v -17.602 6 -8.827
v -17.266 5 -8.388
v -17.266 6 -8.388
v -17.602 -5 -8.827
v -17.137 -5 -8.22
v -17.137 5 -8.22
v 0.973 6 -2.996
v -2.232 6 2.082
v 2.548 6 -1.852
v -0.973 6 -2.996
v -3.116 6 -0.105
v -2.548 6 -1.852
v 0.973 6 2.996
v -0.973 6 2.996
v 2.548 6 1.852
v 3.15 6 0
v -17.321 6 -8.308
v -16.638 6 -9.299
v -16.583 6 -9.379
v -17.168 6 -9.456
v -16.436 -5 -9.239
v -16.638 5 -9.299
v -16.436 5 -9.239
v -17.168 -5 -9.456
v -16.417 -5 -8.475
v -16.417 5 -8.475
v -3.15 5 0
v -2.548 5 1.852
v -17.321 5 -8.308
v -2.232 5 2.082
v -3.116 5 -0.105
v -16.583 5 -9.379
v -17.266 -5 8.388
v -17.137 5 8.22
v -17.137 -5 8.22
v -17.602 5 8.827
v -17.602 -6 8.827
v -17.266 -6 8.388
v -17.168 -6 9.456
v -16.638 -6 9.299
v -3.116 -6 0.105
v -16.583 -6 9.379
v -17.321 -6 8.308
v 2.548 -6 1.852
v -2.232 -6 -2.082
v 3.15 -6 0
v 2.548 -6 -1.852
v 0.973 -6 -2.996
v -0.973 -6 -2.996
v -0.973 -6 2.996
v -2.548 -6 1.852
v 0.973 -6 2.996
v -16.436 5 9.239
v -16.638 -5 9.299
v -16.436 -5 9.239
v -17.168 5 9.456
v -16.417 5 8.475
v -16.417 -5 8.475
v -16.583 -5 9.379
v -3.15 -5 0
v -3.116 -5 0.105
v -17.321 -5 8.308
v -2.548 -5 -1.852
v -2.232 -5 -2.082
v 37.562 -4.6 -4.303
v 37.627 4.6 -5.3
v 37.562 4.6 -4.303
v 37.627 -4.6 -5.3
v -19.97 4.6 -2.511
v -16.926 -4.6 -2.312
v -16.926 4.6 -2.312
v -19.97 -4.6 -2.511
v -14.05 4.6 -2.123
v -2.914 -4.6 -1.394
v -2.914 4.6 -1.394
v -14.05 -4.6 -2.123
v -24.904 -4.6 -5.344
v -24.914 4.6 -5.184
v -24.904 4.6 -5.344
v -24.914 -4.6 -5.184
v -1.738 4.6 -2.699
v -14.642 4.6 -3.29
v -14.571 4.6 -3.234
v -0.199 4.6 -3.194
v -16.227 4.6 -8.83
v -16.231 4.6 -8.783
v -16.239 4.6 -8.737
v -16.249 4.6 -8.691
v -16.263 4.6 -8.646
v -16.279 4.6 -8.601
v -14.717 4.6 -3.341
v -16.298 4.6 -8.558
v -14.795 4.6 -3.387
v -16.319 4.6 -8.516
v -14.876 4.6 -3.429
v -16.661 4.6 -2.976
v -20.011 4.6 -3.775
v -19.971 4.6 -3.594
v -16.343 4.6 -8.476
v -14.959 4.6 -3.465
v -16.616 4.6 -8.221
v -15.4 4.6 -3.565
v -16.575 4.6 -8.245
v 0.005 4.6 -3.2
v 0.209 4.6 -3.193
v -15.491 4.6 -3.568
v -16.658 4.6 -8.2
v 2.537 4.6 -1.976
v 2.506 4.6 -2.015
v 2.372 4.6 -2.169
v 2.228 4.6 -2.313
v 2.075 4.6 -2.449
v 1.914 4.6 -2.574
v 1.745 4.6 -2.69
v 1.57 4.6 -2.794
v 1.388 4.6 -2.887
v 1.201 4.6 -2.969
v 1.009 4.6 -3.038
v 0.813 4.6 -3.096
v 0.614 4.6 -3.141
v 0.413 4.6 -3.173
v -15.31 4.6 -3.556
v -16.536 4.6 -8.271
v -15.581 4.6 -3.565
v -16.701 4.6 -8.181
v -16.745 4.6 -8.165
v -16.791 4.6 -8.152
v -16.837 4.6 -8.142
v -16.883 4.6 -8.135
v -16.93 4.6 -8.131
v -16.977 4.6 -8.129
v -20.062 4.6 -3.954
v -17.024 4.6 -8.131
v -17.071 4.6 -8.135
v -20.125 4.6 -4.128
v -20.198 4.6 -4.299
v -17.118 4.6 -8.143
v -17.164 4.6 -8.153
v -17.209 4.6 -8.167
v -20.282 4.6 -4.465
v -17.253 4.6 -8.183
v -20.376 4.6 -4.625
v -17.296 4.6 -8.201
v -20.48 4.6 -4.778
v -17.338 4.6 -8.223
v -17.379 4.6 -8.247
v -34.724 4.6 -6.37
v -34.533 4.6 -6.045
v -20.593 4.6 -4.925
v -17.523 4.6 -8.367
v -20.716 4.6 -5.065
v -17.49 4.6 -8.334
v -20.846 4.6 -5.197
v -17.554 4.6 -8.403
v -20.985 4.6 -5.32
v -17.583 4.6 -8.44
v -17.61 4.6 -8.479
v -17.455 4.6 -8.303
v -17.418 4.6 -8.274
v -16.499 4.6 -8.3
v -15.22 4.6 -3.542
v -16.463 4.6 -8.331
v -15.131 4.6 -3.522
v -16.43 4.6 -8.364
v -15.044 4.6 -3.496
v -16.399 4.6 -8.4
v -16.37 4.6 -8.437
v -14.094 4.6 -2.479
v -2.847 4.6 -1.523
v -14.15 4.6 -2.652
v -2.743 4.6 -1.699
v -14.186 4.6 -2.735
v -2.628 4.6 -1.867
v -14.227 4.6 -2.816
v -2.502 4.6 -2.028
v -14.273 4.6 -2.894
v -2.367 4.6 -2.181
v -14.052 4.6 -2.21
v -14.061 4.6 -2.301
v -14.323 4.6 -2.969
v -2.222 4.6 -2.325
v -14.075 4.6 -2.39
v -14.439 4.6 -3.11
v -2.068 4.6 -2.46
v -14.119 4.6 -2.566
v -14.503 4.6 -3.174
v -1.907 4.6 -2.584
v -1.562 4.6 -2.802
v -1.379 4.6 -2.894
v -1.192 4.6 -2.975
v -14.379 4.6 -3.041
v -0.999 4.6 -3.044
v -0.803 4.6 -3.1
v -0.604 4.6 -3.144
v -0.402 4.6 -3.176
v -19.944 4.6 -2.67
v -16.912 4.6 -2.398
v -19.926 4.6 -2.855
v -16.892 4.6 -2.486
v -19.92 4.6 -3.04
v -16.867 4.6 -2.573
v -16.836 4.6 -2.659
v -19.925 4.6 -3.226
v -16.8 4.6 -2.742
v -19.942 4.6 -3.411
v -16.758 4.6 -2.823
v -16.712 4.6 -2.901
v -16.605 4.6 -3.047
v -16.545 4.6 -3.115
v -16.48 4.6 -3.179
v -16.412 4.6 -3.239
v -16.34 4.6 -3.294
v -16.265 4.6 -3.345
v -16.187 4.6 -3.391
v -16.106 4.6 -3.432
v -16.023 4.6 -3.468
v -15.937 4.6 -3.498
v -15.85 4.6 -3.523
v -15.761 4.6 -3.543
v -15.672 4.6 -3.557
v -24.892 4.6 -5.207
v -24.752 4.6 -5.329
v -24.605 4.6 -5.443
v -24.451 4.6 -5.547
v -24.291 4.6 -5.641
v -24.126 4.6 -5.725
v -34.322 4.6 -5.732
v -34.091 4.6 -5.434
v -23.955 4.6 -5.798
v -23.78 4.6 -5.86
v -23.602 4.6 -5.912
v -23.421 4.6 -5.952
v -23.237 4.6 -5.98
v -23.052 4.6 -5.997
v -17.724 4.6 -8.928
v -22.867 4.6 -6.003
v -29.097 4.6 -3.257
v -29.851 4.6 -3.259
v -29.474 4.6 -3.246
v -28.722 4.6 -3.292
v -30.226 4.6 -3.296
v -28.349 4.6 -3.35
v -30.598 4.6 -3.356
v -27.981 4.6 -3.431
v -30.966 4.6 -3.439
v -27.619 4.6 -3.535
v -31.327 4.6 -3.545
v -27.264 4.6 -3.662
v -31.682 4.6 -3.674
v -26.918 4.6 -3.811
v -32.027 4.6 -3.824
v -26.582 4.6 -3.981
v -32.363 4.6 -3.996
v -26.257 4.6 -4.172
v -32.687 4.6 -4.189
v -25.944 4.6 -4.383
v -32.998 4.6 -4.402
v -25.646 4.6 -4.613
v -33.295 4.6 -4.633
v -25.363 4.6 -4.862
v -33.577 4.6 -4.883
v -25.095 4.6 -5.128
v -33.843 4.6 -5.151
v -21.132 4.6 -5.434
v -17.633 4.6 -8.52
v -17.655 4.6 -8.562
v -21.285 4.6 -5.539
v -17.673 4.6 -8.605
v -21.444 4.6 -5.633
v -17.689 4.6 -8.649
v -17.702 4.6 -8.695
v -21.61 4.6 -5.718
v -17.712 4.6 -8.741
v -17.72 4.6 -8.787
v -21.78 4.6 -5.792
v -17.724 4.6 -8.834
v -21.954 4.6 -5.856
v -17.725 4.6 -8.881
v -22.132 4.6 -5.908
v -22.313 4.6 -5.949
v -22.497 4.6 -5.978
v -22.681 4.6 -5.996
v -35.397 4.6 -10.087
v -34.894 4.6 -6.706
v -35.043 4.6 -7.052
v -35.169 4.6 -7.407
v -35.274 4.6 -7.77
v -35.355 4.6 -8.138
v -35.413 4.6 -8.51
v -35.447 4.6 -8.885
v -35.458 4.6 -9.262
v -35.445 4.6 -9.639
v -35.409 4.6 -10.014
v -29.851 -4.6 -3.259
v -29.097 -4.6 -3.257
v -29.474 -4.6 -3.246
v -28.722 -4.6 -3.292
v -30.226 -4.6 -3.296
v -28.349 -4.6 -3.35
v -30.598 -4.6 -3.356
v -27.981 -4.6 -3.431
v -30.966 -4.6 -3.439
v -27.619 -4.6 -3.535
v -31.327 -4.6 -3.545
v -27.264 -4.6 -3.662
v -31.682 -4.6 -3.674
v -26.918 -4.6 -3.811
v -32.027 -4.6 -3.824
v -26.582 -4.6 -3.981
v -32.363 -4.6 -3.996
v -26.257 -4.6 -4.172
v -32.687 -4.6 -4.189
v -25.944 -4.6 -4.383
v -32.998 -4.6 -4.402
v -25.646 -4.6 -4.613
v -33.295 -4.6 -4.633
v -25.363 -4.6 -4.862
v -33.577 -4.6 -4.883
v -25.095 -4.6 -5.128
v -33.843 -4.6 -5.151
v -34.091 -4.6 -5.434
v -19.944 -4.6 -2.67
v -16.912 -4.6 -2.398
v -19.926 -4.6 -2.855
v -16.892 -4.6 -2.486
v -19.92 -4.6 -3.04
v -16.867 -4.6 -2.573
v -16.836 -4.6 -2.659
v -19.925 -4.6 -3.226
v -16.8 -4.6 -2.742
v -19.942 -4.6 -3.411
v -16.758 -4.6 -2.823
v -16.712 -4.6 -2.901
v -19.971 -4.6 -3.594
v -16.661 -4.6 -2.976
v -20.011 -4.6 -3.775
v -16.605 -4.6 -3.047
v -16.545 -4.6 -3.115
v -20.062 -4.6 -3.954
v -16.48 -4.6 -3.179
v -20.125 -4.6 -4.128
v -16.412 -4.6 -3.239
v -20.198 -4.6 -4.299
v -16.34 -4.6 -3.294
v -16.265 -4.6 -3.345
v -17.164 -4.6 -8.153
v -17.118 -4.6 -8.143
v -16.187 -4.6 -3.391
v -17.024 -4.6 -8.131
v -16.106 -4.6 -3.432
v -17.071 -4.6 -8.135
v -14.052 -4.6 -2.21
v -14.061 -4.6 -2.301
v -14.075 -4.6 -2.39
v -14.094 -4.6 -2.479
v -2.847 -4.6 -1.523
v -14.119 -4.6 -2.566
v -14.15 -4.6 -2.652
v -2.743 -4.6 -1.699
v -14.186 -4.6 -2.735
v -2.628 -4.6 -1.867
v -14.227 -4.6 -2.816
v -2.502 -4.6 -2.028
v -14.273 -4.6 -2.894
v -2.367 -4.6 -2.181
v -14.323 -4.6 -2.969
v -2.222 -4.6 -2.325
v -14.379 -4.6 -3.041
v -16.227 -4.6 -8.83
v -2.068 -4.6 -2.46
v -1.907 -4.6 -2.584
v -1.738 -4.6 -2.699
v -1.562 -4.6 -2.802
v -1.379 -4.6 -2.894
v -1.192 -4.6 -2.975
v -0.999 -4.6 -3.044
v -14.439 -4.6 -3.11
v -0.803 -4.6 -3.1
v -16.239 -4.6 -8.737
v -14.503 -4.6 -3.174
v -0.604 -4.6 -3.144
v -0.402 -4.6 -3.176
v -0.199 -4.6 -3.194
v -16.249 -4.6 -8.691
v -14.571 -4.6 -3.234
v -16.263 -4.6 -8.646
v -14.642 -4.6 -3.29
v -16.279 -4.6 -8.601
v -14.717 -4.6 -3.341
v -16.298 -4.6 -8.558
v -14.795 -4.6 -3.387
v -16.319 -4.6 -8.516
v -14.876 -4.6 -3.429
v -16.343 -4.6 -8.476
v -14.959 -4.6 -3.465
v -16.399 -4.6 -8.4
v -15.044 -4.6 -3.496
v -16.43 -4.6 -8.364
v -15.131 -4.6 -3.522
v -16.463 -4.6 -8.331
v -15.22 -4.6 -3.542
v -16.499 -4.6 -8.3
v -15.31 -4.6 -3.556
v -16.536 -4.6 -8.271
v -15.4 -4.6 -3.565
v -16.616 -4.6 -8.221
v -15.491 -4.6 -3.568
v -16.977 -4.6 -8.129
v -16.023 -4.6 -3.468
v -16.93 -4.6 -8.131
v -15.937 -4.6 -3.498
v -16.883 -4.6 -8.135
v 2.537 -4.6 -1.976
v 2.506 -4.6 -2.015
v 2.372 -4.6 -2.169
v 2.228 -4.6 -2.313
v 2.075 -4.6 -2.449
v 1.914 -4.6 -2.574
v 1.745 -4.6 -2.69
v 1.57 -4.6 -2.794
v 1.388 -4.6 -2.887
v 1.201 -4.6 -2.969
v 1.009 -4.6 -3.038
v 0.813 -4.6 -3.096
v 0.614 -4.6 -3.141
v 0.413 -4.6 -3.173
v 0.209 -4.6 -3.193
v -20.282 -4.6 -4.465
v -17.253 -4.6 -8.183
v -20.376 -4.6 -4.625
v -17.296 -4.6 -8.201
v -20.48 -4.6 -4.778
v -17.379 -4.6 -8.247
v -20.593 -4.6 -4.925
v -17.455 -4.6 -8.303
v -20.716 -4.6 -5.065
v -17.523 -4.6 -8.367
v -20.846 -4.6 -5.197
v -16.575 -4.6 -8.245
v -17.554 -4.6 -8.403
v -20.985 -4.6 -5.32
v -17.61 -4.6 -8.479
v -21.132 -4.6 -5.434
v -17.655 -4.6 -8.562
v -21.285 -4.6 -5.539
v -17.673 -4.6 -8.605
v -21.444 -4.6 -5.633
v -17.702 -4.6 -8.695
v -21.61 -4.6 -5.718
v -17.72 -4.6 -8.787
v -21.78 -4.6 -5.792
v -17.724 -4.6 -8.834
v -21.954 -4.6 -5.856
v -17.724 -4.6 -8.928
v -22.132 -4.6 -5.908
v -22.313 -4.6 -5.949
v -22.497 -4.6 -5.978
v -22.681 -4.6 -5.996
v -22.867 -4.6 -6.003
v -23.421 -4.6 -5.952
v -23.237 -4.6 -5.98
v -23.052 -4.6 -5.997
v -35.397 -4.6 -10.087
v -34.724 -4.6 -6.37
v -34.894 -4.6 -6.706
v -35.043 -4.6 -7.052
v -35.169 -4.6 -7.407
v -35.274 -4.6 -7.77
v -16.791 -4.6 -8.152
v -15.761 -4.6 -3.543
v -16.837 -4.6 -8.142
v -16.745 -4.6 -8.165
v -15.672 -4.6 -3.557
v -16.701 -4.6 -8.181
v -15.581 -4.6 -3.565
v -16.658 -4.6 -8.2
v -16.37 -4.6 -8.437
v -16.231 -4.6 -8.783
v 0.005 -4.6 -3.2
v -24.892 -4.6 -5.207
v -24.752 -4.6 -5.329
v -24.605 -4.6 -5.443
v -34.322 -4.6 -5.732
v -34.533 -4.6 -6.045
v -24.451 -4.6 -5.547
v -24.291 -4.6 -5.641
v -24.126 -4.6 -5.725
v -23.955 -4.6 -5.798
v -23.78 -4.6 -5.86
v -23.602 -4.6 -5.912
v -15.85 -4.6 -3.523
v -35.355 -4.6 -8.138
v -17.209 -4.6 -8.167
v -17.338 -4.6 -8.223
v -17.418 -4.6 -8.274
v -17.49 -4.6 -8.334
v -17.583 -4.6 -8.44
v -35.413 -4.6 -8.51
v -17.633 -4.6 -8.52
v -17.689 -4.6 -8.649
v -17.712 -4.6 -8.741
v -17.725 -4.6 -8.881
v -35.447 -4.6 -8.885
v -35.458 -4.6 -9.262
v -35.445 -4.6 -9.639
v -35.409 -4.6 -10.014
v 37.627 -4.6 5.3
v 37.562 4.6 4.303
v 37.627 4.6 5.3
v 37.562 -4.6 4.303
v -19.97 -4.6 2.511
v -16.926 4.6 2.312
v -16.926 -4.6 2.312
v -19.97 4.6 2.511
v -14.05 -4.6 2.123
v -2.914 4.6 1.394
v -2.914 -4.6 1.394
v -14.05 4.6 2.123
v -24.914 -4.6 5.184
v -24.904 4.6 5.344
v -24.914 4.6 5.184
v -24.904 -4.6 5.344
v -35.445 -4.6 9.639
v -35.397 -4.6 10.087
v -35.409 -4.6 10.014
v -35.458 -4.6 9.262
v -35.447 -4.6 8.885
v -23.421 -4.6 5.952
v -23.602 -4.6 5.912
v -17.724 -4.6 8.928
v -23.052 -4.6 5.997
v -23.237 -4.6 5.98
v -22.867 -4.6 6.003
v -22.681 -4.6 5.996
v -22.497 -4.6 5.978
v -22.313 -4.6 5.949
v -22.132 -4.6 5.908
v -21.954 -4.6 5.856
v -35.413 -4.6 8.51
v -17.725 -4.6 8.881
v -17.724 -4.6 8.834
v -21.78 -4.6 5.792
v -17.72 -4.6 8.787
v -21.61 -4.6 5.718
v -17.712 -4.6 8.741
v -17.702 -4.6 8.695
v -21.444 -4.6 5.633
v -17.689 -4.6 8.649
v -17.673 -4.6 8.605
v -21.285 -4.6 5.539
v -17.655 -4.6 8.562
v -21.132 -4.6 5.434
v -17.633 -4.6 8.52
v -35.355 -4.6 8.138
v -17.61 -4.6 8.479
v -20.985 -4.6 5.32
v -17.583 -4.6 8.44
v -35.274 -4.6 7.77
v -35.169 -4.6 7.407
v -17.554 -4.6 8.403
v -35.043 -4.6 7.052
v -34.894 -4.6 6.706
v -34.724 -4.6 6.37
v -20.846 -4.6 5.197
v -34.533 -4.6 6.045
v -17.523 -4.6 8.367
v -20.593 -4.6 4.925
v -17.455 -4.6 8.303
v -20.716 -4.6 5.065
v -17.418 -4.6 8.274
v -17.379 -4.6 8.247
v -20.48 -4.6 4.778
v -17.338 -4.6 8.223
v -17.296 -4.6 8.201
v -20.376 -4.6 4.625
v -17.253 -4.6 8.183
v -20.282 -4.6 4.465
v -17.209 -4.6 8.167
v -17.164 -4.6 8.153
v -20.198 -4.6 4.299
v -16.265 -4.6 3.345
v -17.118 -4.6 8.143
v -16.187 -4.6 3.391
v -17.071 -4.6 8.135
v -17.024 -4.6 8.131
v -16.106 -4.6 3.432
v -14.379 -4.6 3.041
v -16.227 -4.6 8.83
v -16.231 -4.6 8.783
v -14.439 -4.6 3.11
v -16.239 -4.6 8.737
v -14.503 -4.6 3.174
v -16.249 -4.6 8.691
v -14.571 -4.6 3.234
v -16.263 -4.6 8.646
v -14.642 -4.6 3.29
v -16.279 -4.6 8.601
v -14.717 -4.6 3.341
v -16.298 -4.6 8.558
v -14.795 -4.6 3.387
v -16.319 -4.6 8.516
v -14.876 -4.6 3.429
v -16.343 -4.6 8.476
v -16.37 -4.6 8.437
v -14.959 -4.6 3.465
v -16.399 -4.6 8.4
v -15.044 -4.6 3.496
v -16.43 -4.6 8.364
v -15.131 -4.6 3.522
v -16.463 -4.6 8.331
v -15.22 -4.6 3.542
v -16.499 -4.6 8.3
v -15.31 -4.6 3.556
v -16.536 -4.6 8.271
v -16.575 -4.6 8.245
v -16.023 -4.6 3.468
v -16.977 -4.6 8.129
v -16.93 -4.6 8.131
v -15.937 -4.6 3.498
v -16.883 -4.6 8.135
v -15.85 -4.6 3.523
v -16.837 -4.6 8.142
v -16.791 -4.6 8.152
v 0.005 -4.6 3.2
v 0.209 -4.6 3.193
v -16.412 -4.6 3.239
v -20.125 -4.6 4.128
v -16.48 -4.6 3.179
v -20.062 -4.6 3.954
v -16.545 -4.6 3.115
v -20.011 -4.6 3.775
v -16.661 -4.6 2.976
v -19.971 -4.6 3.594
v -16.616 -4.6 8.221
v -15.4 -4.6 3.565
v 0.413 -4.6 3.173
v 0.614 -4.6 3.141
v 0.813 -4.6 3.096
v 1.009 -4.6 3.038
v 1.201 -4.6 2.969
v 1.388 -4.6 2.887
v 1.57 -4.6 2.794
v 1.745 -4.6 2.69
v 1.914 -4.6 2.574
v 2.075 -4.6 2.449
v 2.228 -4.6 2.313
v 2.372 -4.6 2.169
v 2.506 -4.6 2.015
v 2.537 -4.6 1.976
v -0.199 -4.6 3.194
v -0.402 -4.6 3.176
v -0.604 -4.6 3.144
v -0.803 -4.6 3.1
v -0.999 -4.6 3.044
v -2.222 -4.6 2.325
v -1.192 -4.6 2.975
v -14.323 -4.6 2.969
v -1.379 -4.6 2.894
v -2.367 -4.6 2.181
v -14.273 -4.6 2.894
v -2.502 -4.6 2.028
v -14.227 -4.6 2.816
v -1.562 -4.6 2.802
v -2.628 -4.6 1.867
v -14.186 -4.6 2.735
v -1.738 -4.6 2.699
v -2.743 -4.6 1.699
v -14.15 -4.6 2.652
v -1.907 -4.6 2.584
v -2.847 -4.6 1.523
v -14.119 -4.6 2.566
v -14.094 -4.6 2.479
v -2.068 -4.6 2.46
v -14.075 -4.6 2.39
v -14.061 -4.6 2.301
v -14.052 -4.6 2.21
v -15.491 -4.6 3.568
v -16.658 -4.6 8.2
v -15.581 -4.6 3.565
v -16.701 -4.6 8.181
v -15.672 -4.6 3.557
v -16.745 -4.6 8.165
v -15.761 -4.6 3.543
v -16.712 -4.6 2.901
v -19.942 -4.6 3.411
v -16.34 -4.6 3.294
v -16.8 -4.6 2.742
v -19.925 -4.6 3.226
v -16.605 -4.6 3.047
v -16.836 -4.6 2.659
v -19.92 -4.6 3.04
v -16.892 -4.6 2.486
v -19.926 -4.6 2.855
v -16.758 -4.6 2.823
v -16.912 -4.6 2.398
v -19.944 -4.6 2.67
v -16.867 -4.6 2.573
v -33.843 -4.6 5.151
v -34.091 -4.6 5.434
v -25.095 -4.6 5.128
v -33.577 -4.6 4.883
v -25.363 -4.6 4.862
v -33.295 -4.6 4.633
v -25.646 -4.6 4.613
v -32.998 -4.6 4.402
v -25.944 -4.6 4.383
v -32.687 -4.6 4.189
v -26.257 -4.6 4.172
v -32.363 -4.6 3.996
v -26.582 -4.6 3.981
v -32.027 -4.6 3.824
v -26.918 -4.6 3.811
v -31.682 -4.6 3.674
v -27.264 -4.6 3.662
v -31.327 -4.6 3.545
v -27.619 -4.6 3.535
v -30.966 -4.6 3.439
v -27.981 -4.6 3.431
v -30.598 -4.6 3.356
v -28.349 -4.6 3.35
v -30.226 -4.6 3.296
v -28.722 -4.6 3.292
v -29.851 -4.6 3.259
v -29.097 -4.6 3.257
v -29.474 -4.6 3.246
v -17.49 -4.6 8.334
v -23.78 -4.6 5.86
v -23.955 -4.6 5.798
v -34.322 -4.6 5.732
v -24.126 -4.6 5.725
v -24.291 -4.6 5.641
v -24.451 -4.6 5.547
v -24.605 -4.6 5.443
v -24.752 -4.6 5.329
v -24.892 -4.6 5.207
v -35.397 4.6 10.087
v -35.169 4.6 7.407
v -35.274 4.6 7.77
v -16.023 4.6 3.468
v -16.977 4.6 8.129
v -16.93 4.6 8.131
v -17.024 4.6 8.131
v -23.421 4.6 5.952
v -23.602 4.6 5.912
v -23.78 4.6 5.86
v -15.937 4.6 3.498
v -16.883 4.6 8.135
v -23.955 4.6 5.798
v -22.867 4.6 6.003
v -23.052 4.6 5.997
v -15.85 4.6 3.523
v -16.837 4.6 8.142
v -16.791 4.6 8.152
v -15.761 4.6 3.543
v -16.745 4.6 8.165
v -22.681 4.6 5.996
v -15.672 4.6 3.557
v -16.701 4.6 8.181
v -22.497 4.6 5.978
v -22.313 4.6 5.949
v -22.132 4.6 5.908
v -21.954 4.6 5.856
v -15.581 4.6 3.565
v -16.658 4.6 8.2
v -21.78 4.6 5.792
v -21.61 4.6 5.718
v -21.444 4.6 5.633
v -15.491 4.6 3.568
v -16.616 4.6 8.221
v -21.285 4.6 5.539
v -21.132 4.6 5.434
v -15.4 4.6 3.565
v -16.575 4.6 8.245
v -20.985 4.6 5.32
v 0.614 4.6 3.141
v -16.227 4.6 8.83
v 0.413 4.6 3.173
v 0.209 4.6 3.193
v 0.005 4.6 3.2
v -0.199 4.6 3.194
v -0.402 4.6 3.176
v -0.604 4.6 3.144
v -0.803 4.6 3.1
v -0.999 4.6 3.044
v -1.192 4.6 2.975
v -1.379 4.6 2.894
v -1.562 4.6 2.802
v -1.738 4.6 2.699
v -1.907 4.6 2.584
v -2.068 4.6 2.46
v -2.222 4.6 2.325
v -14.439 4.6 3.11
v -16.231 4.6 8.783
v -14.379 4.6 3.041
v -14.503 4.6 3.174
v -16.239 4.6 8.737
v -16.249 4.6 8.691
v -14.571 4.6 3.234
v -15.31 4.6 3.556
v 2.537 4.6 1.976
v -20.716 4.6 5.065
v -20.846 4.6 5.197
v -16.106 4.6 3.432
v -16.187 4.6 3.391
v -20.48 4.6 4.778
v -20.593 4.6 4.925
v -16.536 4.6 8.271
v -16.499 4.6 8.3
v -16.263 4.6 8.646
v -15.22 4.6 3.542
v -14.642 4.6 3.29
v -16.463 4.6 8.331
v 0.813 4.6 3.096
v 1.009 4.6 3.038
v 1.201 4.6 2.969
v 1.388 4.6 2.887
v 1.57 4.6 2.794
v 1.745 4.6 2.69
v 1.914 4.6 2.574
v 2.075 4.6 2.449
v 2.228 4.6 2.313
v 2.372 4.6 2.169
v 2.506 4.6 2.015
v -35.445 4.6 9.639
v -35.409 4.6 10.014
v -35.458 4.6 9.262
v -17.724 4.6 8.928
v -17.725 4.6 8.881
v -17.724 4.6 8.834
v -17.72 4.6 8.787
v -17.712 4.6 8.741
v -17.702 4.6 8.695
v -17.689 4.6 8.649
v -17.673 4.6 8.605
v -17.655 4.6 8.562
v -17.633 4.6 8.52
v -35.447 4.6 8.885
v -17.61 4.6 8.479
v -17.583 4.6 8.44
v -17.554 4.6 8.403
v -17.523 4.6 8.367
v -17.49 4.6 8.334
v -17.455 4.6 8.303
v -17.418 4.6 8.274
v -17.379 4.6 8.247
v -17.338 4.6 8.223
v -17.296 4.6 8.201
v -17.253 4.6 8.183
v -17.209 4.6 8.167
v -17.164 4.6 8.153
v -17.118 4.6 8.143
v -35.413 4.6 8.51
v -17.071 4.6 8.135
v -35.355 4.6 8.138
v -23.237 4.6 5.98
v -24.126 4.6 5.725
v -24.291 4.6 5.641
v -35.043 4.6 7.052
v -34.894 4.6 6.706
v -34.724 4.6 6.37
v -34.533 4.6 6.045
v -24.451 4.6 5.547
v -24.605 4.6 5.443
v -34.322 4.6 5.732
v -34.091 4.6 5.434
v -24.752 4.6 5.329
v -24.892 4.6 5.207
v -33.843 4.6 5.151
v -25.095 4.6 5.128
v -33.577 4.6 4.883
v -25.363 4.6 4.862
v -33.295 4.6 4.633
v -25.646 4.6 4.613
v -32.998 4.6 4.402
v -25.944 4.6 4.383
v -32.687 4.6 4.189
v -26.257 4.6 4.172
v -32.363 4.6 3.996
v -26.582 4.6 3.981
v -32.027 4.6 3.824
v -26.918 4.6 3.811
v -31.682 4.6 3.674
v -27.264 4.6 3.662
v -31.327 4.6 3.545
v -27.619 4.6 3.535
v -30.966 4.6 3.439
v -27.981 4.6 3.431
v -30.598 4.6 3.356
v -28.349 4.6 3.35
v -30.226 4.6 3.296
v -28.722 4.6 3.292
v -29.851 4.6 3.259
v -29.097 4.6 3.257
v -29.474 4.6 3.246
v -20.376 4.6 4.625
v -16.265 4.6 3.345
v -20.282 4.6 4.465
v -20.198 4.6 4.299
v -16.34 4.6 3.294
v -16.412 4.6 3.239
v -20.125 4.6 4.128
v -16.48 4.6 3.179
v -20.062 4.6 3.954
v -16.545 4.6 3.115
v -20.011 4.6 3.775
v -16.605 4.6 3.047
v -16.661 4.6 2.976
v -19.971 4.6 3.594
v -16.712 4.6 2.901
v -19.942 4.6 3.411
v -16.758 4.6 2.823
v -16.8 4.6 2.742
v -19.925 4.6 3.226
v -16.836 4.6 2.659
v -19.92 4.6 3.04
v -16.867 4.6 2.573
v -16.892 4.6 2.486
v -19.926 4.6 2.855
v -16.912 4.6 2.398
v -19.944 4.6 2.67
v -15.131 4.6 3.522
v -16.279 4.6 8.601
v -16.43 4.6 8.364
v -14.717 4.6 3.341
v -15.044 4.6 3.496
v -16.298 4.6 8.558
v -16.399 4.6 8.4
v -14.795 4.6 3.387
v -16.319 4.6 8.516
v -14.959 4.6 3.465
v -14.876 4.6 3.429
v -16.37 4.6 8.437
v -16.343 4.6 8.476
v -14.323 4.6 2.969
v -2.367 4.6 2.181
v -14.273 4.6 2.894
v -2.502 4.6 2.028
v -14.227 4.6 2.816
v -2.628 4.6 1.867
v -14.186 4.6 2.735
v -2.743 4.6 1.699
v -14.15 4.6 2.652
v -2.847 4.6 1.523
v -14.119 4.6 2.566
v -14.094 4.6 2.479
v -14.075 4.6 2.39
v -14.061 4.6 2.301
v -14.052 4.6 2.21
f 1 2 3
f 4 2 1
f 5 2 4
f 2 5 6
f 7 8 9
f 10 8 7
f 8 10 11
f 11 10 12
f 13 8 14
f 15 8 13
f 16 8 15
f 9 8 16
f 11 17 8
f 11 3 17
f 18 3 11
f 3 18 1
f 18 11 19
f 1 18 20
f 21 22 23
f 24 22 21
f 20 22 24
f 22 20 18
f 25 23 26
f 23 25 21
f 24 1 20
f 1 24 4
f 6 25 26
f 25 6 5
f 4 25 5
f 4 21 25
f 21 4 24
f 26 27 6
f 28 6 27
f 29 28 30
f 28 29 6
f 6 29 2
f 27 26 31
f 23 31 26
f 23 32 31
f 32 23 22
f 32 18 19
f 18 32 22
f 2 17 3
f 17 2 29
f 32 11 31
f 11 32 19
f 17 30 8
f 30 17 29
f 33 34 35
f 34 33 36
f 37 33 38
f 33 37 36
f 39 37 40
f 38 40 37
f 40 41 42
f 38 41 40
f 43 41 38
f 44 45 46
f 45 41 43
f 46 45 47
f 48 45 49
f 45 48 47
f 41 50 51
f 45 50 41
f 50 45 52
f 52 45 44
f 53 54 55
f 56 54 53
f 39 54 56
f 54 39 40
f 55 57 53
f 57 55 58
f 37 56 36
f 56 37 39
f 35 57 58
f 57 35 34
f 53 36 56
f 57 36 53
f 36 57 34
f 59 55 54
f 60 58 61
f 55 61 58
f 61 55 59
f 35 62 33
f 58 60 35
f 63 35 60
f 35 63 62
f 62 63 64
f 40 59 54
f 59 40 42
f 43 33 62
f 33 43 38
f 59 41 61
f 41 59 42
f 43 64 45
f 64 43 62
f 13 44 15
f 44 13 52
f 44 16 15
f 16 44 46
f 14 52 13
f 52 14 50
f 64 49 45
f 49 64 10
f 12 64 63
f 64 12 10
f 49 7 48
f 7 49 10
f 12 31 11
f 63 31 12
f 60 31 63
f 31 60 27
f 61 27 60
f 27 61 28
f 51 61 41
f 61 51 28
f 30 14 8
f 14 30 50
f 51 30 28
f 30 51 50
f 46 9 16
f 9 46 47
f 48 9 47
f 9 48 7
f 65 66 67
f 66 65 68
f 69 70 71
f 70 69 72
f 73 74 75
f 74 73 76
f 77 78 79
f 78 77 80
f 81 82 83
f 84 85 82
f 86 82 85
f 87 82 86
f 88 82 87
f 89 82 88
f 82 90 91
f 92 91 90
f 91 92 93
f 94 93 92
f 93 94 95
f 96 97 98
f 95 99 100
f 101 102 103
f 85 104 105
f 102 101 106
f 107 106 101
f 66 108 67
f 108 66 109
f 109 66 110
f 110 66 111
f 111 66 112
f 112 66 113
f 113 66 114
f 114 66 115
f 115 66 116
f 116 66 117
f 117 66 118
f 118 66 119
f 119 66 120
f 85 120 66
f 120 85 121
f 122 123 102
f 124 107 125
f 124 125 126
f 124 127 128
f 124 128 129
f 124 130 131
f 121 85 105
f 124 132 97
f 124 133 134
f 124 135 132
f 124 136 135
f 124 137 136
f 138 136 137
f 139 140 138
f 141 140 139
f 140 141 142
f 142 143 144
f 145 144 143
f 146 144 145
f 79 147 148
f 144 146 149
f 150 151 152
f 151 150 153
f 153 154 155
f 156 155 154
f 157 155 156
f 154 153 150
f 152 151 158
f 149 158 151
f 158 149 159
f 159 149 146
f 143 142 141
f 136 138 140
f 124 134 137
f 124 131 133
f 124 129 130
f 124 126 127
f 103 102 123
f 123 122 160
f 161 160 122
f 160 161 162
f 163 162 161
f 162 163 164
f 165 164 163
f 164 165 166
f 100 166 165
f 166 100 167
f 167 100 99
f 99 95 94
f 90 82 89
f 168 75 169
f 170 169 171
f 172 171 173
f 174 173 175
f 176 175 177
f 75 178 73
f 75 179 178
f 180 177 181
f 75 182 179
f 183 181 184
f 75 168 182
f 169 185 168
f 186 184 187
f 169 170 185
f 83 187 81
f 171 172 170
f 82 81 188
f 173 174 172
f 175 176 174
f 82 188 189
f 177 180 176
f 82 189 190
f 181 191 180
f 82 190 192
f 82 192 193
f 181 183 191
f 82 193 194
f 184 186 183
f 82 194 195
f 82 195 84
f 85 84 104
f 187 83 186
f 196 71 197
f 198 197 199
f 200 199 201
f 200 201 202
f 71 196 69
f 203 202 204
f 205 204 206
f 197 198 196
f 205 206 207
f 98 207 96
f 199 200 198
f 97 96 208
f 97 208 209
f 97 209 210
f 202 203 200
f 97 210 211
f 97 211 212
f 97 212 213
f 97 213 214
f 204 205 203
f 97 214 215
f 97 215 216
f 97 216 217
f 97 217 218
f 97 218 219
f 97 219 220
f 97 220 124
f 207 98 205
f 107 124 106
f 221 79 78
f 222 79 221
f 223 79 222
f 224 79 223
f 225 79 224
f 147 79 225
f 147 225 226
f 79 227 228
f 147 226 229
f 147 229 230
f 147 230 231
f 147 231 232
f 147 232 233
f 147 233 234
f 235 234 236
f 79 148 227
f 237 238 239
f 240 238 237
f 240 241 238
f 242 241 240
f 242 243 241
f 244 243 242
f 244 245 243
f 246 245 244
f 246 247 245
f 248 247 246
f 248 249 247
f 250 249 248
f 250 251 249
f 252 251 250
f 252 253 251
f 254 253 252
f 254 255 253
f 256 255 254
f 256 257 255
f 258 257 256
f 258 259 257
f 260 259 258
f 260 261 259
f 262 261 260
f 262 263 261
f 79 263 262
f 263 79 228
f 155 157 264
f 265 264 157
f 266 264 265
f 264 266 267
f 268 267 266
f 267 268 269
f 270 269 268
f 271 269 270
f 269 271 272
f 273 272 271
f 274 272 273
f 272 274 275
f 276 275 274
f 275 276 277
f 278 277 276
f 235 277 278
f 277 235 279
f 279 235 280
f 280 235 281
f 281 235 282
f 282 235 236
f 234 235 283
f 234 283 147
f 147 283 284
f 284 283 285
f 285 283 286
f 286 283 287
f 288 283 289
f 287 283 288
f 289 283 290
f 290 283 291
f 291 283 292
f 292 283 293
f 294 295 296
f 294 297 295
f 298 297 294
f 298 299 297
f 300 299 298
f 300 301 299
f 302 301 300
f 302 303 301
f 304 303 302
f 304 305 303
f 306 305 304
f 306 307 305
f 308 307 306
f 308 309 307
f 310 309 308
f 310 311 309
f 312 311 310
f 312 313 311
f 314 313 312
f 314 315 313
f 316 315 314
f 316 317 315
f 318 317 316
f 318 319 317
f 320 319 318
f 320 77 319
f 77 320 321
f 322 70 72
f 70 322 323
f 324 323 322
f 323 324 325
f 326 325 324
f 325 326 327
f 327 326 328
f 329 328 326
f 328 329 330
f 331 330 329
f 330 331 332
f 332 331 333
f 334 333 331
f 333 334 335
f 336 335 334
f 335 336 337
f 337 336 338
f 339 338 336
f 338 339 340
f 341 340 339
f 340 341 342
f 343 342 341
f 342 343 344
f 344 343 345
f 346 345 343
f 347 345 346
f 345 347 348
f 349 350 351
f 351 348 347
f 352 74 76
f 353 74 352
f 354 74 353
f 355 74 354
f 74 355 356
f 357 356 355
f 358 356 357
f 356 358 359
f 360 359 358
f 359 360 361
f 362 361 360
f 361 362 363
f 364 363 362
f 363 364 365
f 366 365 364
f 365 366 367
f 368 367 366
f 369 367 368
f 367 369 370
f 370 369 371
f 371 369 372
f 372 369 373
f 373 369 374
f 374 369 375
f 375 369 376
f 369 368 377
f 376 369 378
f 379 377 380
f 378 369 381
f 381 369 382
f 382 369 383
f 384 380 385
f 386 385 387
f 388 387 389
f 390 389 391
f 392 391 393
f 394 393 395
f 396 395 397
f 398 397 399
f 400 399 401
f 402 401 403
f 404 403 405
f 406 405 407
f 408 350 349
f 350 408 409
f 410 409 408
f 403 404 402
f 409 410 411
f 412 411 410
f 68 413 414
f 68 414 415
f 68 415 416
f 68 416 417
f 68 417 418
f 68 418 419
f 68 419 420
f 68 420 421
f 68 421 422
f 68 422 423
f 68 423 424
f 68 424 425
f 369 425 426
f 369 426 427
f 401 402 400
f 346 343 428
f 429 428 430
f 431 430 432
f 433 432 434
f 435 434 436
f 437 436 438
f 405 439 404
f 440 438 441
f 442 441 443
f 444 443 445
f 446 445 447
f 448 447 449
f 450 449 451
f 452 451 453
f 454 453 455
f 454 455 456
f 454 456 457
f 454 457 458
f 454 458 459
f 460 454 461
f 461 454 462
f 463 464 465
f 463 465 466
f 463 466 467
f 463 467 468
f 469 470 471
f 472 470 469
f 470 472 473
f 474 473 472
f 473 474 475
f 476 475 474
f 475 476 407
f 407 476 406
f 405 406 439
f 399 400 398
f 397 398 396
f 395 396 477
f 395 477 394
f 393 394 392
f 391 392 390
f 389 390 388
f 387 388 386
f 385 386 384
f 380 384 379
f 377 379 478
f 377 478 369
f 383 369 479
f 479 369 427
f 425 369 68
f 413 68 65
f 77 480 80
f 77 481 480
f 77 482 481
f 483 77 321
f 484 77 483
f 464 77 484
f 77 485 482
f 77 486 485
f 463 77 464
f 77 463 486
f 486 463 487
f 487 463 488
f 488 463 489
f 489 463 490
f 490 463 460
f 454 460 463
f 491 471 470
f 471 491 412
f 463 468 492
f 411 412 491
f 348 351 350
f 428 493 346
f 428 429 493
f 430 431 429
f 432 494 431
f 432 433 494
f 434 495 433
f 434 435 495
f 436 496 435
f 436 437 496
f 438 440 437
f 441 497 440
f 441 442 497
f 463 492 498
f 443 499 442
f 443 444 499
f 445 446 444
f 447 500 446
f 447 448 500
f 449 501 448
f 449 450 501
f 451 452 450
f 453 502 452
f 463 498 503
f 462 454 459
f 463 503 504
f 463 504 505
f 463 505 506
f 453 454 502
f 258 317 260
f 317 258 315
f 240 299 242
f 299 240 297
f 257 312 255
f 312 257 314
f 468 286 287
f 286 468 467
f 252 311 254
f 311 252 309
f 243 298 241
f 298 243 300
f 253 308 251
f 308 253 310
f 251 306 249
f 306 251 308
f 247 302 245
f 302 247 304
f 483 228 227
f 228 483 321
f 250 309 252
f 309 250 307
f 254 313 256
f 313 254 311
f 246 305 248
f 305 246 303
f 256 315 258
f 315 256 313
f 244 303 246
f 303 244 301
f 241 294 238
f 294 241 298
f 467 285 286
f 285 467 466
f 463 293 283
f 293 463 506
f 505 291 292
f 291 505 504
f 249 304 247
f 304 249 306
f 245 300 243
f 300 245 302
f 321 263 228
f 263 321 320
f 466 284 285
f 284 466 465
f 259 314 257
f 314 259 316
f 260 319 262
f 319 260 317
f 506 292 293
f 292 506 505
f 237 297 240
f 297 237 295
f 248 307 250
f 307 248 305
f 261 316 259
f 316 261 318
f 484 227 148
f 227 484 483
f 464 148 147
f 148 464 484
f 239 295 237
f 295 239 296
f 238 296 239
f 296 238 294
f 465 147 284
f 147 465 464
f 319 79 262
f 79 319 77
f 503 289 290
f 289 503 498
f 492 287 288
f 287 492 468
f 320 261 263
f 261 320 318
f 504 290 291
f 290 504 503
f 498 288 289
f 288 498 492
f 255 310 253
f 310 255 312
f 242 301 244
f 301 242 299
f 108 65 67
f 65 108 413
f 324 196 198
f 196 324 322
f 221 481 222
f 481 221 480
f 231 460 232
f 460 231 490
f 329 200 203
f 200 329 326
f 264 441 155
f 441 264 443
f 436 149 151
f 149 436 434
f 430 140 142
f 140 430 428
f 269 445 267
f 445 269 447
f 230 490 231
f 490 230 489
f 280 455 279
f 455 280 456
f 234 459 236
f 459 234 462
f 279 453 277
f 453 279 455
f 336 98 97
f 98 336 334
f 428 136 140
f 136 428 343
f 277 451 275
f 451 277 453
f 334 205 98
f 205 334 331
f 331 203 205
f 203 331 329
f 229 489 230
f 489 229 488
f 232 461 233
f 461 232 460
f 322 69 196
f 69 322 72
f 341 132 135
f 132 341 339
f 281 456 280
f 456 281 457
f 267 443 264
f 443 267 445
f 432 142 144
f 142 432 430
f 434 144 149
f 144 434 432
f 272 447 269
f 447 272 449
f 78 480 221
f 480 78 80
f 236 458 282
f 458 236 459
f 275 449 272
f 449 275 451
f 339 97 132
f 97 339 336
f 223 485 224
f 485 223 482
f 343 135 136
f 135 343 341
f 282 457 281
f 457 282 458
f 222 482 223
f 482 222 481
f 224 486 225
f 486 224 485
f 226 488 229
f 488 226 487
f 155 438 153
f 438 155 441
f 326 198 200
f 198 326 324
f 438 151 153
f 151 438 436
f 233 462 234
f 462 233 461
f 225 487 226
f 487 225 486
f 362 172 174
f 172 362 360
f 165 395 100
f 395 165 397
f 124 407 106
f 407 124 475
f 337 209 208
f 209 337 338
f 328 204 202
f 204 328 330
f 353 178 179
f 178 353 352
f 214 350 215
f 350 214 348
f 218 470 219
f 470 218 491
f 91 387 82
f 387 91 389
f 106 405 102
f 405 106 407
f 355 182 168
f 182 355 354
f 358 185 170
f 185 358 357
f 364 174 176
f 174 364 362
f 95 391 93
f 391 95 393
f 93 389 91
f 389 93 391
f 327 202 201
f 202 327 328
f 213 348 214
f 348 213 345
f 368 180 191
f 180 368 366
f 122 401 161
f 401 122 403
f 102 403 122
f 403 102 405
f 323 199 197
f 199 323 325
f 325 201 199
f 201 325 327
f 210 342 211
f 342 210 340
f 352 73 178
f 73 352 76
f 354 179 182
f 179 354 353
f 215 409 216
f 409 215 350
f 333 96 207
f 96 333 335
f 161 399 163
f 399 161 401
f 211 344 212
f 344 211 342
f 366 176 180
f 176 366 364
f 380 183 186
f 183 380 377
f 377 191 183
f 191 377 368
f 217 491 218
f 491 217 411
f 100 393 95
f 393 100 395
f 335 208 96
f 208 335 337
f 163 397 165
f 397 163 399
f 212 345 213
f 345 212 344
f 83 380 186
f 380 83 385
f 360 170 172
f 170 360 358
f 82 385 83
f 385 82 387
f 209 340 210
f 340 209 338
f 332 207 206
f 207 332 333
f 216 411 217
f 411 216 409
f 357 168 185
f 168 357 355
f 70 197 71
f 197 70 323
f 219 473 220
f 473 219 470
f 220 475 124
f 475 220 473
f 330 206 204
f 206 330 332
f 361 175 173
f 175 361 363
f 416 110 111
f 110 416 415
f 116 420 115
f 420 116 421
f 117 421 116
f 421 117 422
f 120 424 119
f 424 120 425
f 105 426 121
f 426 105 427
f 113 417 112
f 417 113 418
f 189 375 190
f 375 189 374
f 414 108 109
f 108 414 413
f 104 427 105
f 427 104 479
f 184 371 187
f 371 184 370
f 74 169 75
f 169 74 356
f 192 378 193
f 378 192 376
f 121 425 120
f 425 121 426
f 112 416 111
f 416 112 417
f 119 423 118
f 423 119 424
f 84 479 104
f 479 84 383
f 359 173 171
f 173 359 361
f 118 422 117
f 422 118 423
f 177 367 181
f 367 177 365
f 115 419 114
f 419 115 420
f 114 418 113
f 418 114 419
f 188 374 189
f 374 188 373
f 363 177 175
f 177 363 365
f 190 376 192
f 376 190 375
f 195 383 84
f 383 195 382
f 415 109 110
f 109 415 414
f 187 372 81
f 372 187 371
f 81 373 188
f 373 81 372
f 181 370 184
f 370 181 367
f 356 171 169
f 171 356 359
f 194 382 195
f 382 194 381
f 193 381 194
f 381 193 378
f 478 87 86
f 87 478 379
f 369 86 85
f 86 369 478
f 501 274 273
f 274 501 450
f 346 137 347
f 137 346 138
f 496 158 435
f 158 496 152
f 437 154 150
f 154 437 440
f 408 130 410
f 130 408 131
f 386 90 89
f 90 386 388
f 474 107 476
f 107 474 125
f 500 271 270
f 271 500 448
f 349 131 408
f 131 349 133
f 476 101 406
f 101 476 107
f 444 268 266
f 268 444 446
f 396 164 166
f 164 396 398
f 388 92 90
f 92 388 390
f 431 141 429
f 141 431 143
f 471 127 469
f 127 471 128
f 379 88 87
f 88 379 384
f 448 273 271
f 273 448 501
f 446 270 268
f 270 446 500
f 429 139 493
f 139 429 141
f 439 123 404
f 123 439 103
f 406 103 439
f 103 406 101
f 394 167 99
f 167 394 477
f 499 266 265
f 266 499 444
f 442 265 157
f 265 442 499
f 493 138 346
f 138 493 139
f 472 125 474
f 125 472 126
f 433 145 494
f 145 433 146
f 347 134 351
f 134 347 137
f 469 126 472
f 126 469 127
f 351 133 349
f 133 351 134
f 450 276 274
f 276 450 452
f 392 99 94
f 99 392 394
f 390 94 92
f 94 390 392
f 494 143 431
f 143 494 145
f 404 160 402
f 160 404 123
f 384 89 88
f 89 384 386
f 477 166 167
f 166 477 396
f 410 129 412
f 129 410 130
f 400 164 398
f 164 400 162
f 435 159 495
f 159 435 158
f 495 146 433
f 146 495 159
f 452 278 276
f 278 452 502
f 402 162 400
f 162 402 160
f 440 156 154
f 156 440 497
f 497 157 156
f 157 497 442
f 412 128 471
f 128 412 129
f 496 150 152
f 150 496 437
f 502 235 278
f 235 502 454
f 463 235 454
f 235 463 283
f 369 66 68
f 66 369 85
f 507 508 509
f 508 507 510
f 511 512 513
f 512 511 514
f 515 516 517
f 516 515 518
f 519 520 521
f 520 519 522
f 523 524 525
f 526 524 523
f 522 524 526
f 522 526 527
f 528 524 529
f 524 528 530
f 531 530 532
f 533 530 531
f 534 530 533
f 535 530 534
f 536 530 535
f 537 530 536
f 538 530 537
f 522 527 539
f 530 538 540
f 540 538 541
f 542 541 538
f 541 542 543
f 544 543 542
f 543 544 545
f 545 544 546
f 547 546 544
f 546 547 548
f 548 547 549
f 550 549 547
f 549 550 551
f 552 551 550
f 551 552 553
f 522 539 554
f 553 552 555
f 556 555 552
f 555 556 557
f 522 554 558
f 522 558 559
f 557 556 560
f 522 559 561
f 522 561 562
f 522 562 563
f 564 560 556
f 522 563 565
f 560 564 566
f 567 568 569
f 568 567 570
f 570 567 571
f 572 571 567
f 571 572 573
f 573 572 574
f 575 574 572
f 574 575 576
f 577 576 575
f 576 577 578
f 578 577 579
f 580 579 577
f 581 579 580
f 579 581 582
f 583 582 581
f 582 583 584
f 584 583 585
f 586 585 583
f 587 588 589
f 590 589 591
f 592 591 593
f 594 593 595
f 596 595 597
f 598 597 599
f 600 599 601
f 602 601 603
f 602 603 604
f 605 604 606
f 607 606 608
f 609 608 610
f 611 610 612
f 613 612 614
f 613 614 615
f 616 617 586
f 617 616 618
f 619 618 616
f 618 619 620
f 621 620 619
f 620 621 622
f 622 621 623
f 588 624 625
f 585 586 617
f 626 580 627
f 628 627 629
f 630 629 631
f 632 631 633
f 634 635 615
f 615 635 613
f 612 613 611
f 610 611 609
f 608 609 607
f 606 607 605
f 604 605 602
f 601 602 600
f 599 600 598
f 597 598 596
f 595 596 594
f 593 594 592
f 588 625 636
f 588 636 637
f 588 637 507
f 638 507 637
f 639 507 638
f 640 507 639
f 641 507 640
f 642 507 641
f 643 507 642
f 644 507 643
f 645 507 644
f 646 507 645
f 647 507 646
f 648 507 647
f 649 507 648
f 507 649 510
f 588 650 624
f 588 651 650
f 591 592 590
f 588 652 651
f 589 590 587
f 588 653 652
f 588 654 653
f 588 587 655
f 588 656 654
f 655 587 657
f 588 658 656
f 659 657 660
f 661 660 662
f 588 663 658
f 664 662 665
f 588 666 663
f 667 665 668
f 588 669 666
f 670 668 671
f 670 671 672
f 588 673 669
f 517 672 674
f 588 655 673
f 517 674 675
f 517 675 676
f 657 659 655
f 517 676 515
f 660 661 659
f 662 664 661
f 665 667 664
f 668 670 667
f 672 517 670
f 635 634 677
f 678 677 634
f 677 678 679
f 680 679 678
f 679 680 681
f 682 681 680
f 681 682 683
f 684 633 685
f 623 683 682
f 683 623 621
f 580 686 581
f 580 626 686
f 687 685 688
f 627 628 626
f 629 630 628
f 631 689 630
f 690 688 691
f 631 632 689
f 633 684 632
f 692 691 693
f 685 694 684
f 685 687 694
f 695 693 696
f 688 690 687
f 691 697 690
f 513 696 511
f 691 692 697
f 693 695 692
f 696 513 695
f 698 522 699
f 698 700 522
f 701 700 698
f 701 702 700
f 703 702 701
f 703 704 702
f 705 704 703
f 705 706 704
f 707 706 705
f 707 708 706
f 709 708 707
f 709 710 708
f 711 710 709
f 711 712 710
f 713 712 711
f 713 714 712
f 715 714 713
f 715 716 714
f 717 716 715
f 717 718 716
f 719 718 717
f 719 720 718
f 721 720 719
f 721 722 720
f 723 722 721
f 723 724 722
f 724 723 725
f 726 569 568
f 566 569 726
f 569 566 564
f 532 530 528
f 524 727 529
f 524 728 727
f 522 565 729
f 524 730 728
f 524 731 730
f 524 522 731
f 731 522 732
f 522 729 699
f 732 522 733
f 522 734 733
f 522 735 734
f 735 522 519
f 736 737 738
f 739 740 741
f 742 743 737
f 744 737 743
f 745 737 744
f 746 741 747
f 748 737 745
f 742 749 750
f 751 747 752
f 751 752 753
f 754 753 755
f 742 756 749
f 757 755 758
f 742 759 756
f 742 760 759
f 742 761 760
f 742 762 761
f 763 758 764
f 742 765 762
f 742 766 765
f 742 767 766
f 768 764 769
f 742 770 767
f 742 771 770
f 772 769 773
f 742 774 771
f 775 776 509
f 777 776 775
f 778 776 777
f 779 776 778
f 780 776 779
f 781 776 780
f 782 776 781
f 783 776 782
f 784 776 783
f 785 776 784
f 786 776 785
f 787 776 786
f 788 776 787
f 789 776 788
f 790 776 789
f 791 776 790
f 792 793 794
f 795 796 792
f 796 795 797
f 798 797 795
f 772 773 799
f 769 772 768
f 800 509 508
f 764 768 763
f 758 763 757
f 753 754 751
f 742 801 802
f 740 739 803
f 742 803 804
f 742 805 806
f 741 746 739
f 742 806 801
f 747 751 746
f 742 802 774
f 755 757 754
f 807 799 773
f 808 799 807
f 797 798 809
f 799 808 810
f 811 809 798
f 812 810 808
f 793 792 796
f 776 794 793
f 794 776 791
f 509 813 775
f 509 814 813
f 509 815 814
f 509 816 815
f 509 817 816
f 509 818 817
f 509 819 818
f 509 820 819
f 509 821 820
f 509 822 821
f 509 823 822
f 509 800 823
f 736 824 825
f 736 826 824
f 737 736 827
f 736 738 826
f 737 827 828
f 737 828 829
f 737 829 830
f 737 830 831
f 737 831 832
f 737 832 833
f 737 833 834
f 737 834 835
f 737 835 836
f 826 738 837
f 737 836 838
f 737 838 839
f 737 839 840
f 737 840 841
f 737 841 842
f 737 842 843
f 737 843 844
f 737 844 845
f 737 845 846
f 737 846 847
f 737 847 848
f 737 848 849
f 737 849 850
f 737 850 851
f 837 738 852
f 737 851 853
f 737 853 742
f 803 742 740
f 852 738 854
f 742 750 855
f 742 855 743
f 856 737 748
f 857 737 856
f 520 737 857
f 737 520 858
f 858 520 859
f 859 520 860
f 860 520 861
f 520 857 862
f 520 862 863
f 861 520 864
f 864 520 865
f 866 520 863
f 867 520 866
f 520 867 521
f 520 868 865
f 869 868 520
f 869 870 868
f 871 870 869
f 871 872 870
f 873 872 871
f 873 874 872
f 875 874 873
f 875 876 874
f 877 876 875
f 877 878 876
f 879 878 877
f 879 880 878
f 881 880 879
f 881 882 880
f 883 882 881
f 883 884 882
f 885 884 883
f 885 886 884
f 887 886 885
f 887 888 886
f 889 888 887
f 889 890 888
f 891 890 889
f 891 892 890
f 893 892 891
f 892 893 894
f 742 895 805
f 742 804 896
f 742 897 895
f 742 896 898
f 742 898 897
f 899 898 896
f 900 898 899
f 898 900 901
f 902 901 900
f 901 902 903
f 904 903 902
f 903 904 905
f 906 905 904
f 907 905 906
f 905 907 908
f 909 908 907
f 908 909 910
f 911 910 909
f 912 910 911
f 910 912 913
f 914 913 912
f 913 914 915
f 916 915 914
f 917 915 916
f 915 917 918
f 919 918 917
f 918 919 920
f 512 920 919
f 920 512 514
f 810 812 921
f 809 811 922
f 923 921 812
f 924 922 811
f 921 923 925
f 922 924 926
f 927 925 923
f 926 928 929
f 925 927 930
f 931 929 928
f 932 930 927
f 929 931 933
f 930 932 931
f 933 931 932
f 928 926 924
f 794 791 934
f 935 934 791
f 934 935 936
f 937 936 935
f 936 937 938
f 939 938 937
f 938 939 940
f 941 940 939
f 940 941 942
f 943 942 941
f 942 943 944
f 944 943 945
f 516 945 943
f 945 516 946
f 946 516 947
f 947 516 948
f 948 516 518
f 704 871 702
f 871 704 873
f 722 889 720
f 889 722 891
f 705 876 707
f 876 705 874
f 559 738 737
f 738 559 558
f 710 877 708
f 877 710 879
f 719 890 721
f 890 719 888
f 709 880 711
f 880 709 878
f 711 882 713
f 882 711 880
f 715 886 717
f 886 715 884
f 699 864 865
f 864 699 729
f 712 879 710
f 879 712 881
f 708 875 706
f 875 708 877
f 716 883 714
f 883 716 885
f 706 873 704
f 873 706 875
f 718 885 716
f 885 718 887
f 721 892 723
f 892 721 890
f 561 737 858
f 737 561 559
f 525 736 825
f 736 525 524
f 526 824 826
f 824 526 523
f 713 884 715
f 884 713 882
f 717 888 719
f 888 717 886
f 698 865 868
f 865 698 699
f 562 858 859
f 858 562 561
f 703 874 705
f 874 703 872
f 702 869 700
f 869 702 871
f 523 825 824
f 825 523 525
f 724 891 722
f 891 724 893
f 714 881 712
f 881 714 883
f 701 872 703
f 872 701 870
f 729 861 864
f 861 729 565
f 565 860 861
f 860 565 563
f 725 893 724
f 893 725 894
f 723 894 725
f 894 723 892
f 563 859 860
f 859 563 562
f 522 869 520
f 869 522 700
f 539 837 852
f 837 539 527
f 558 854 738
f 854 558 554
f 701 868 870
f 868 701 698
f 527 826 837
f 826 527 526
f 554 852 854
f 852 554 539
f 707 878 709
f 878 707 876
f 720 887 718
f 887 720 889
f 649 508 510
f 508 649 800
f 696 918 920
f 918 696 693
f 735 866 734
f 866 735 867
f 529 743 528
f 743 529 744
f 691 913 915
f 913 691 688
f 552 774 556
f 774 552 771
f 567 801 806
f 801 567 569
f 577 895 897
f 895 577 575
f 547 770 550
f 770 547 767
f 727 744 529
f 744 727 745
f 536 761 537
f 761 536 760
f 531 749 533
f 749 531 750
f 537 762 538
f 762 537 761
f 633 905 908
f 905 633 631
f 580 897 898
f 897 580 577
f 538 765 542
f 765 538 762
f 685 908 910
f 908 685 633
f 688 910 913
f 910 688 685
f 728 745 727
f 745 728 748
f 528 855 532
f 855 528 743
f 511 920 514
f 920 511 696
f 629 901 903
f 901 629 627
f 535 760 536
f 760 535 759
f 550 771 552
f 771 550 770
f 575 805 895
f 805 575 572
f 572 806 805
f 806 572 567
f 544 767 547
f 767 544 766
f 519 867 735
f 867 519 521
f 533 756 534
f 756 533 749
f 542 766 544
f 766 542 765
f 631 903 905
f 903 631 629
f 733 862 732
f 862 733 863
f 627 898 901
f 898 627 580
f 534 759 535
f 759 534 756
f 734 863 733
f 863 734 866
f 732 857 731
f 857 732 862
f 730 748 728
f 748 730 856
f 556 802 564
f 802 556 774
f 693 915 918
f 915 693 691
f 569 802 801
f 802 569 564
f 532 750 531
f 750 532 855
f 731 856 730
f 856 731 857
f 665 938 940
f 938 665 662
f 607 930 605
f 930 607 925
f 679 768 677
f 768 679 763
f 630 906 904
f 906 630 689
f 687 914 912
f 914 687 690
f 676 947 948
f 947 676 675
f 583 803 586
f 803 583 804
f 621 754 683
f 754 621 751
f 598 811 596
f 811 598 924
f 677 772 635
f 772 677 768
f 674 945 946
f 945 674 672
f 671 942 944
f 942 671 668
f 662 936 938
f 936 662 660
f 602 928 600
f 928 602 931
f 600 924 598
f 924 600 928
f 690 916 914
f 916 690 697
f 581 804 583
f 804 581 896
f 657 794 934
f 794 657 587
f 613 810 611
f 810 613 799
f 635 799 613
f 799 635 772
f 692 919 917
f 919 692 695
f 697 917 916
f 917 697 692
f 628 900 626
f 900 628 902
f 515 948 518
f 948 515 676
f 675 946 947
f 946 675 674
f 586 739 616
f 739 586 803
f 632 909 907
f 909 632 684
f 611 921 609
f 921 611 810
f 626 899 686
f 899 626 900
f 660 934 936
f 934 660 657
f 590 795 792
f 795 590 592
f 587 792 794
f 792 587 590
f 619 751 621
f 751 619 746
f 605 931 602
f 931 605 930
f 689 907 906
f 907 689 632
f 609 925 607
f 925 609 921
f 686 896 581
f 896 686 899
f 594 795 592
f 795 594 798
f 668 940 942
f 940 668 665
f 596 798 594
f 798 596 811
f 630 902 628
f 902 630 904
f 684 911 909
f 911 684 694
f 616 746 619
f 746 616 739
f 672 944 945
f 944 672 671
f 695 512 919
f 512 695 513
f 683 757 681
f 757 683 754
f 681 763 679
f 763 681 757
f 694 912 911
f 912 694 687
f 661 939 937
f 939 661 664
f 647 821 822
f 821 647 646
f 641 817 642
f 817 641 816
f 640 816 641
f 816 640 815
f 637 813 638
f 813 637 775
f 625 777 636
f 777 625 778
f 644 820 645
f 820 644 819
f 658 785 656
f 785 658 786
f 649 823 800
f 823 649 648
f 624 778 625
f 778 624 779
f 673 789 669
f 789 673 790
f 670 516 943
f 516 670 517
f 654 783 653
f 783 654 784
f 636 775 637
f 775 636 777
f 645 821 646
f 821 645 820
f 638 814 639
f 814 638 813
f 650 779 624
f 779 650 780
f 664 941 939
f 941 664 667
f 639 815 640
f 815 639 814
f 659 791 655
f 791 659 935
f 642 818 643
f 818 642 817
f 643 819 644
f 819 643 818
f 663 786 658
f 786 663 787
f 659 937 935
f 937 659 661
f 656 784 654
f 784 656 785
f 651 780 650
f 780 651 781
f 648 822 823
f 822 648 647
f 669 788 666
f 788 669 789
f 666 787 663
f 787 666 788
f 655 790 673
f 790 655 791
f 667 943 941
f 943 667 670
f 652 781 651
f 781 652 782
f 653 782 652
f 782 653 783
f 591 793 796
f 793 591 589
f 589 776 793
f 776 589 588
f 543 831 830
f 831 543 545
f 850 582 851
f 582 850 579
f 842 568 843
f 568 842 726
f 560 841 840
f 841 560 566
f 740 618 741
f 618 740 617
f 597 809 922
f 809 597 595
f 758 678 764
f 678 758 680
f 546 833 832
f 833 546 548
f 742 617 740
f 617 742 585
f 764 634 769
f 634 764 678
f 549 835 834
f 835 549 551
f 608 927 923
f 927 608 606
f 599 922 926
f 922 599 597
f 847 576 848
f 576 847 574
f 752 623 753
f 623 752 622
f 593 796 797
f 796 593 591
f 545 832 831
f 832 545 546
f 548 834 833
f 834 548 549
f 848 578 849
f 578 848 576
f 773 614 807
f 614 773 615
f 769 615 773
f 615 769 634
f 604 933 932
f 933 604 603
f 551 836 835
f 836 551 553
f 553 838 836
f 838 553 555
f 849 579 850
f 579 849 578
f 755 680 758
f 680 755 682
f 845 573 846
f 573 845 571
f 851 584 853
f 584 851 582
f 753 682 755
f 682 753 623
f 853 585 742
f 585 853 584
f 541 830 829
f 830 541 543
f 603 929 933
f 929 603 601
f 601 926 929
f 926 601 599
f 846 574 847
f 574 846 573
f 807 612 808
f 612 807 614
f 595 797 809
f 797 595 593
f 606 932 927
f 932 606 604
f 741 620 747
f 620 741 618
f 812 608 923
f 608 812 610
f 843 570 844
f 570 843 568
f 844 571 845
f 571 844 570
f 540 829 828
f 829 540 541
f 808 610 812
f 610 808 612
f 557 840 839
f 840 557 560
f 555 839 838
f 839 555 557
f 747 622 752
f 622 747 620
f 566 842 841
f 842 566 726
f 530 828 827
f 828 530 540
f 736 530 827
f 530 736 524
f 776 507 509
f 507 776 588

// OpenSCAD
// file: peg.scad
e = 0.1;
$fn = 100;
module peg (l, w, h, spring_d, spring_l, wire_dia, minw, filled)
{
    w_r    = wire_dia / 2;
    sp_r   = spring_d / 2;
    sp_s   = sqrt (pow (spring_l - sp_r, 2) - pow (h + sp_r, 2));
    hshift = l / 12 * 5 - h * 0.15;
    hrad   = h / 2.2;
    sshift = l / 12;
    s2     = 2 * sshift;
    bck    = 1.5 * h;
    minh   = minw / 2;
    ashift = sshift - sp_r;
    cube_l = l / 6 * 5.2;
    angle  = atan ((h - 2 * minw) / (cube_l / 2 + ashift));
    union () {
        difference () {
            union () {
                difference () {
                    union () {
                        cube ([cube_l, w, h + e], center = true);
                        translate ([-(l / 6 * 5 + l / 6) / 2, 0, -(l / 6 - w)])
                            rotate ([90, 0, 0])
                                cylinder (r = l / 12, h = w, center = true);
                    }
                    if (!filled) {
                        translate ([hrad + minw, 0, minw])
                            cube ([2 * hshift, w - 2 * minw, h], center = true);
                    }
                }
                translate ([0, -minh - e, 0])
                    cube ([l / 6 * 5.2, minw, h], center = true);
                translate ([-sshift + spring_d / 5, 0, -h / 4])
                    cube ([minw, w - e, h / 2], center = true);
            }
            translate ([-hshift, 0, hrad])
                rotate ([90, 0, 0])
                    cylinder (r = hrad, h = w + e, center = true);
            translate ([-0.3 * l, 0, h / 2 + 0.1 * h / 4.5])
                rotate ([90, 0, 0])
                    cylinder (r = h / 4.5, h = w + e, center = true);
            translate ([-sshift, 0, h / 2 + 0.2 * spring_d])
                rotate ([90, 0, 0])
                    cylinder (r = sp_r, h = w + e, center = true);
            translate ([-sp_s -l / 12, 0, -h / 2])
                rotate ([90, 0, 0])
                    cylinder (r = w_r, h = w + e, center = true);
            translate ([0, 0, -l - h / 2])
                cube (2 * l, center = true);
            difference () {
                translate ([cube_l / 4 - ashift / 2, 0, l / cos (angle)])
                    rotate ([0, angle, 0])
                        cube (2 * l, center = true);
                translate ([-1.5 * l - sshift, 0, 0])
                    cube (3 * l, center = true);
                }
        }
        if (!filled) {
            translate ([-s2 - sp_r, -minh - e, h / 2 + e])
                cube ([spring_d, minw, 2 * h - minw - e], center = true);
            translate ([-s2 - minh, -1.25 * minw - e, 0.375 * h + e])
                cube ([minw, 2.5 * minw, 1.5 * h - minw - e], center = true);
            translate ([-s2 - spring_d + minh, -1.25 * minw - e, 0.375 * h+ e])
                cube ([minw, 2.5 * minw, 1.5 * h - minw - e], center = true);
        }
        //translate ([cube_l / 4 - ashift / 2, 0, w + 2 * minw])
        //    cube (minw, center = true);
        //translate ([cube_l / 4 - ashift / 2, 0, h])
        //    cube ([cube_l / 2 + ashift, w, h], center = true);
    }
}

translate ([0, 18, 0])
    peg (72, 9.2, 6.5, 6.75, 21,   1.5, 1, true);
translate ([0, 6, 0])
    peg (72, 9.2, 6.5, 6.75, 21,   1.5, 1, false);
translate ([0, -6, 0])
    peg (72, 9.2, 6.5, 6.6,  21.5, 1.5, 1, false);
translate ([0, -18, 0])
    peg (72, 9.2, 6.5, 6.6,  21.5, 1.5, 1, true);
// main file
use <peg.scad>

e = 0.1;
a = -2.5 + (1 + sin (360 * $t)) * 12.5 / 2;

color ("Silver") {
    rotate ([90, 0, 0])
        cylinder (r = 6.5 / 2 - e, h = 12, center = true);
    for (i = [-1, +1])
        rotate ([i * 90, i * (23.8 + a), 0])
            translate ([-19.12, 0, 0])
                rotate ([0, 0, -7]) {
                    translate ([0, 0, -5])
                        cylinder (r = 1.5 / 2 - e, h = 11);
                    translate ([0, -1.5 / 2 + e, 5])
                        cube ([19.2, 1.5 - 2*e, 1]);
                }
}

color ("BurlyWood") {
    for (rot = [[0, -a, 0], [180, a, 0]])
        rotate (rot) translate ([6, 0, -4.5]) render ()
            peg (72, 9.2, 6.5, 6.5, 23.3, 1.5, 1, true);
}
